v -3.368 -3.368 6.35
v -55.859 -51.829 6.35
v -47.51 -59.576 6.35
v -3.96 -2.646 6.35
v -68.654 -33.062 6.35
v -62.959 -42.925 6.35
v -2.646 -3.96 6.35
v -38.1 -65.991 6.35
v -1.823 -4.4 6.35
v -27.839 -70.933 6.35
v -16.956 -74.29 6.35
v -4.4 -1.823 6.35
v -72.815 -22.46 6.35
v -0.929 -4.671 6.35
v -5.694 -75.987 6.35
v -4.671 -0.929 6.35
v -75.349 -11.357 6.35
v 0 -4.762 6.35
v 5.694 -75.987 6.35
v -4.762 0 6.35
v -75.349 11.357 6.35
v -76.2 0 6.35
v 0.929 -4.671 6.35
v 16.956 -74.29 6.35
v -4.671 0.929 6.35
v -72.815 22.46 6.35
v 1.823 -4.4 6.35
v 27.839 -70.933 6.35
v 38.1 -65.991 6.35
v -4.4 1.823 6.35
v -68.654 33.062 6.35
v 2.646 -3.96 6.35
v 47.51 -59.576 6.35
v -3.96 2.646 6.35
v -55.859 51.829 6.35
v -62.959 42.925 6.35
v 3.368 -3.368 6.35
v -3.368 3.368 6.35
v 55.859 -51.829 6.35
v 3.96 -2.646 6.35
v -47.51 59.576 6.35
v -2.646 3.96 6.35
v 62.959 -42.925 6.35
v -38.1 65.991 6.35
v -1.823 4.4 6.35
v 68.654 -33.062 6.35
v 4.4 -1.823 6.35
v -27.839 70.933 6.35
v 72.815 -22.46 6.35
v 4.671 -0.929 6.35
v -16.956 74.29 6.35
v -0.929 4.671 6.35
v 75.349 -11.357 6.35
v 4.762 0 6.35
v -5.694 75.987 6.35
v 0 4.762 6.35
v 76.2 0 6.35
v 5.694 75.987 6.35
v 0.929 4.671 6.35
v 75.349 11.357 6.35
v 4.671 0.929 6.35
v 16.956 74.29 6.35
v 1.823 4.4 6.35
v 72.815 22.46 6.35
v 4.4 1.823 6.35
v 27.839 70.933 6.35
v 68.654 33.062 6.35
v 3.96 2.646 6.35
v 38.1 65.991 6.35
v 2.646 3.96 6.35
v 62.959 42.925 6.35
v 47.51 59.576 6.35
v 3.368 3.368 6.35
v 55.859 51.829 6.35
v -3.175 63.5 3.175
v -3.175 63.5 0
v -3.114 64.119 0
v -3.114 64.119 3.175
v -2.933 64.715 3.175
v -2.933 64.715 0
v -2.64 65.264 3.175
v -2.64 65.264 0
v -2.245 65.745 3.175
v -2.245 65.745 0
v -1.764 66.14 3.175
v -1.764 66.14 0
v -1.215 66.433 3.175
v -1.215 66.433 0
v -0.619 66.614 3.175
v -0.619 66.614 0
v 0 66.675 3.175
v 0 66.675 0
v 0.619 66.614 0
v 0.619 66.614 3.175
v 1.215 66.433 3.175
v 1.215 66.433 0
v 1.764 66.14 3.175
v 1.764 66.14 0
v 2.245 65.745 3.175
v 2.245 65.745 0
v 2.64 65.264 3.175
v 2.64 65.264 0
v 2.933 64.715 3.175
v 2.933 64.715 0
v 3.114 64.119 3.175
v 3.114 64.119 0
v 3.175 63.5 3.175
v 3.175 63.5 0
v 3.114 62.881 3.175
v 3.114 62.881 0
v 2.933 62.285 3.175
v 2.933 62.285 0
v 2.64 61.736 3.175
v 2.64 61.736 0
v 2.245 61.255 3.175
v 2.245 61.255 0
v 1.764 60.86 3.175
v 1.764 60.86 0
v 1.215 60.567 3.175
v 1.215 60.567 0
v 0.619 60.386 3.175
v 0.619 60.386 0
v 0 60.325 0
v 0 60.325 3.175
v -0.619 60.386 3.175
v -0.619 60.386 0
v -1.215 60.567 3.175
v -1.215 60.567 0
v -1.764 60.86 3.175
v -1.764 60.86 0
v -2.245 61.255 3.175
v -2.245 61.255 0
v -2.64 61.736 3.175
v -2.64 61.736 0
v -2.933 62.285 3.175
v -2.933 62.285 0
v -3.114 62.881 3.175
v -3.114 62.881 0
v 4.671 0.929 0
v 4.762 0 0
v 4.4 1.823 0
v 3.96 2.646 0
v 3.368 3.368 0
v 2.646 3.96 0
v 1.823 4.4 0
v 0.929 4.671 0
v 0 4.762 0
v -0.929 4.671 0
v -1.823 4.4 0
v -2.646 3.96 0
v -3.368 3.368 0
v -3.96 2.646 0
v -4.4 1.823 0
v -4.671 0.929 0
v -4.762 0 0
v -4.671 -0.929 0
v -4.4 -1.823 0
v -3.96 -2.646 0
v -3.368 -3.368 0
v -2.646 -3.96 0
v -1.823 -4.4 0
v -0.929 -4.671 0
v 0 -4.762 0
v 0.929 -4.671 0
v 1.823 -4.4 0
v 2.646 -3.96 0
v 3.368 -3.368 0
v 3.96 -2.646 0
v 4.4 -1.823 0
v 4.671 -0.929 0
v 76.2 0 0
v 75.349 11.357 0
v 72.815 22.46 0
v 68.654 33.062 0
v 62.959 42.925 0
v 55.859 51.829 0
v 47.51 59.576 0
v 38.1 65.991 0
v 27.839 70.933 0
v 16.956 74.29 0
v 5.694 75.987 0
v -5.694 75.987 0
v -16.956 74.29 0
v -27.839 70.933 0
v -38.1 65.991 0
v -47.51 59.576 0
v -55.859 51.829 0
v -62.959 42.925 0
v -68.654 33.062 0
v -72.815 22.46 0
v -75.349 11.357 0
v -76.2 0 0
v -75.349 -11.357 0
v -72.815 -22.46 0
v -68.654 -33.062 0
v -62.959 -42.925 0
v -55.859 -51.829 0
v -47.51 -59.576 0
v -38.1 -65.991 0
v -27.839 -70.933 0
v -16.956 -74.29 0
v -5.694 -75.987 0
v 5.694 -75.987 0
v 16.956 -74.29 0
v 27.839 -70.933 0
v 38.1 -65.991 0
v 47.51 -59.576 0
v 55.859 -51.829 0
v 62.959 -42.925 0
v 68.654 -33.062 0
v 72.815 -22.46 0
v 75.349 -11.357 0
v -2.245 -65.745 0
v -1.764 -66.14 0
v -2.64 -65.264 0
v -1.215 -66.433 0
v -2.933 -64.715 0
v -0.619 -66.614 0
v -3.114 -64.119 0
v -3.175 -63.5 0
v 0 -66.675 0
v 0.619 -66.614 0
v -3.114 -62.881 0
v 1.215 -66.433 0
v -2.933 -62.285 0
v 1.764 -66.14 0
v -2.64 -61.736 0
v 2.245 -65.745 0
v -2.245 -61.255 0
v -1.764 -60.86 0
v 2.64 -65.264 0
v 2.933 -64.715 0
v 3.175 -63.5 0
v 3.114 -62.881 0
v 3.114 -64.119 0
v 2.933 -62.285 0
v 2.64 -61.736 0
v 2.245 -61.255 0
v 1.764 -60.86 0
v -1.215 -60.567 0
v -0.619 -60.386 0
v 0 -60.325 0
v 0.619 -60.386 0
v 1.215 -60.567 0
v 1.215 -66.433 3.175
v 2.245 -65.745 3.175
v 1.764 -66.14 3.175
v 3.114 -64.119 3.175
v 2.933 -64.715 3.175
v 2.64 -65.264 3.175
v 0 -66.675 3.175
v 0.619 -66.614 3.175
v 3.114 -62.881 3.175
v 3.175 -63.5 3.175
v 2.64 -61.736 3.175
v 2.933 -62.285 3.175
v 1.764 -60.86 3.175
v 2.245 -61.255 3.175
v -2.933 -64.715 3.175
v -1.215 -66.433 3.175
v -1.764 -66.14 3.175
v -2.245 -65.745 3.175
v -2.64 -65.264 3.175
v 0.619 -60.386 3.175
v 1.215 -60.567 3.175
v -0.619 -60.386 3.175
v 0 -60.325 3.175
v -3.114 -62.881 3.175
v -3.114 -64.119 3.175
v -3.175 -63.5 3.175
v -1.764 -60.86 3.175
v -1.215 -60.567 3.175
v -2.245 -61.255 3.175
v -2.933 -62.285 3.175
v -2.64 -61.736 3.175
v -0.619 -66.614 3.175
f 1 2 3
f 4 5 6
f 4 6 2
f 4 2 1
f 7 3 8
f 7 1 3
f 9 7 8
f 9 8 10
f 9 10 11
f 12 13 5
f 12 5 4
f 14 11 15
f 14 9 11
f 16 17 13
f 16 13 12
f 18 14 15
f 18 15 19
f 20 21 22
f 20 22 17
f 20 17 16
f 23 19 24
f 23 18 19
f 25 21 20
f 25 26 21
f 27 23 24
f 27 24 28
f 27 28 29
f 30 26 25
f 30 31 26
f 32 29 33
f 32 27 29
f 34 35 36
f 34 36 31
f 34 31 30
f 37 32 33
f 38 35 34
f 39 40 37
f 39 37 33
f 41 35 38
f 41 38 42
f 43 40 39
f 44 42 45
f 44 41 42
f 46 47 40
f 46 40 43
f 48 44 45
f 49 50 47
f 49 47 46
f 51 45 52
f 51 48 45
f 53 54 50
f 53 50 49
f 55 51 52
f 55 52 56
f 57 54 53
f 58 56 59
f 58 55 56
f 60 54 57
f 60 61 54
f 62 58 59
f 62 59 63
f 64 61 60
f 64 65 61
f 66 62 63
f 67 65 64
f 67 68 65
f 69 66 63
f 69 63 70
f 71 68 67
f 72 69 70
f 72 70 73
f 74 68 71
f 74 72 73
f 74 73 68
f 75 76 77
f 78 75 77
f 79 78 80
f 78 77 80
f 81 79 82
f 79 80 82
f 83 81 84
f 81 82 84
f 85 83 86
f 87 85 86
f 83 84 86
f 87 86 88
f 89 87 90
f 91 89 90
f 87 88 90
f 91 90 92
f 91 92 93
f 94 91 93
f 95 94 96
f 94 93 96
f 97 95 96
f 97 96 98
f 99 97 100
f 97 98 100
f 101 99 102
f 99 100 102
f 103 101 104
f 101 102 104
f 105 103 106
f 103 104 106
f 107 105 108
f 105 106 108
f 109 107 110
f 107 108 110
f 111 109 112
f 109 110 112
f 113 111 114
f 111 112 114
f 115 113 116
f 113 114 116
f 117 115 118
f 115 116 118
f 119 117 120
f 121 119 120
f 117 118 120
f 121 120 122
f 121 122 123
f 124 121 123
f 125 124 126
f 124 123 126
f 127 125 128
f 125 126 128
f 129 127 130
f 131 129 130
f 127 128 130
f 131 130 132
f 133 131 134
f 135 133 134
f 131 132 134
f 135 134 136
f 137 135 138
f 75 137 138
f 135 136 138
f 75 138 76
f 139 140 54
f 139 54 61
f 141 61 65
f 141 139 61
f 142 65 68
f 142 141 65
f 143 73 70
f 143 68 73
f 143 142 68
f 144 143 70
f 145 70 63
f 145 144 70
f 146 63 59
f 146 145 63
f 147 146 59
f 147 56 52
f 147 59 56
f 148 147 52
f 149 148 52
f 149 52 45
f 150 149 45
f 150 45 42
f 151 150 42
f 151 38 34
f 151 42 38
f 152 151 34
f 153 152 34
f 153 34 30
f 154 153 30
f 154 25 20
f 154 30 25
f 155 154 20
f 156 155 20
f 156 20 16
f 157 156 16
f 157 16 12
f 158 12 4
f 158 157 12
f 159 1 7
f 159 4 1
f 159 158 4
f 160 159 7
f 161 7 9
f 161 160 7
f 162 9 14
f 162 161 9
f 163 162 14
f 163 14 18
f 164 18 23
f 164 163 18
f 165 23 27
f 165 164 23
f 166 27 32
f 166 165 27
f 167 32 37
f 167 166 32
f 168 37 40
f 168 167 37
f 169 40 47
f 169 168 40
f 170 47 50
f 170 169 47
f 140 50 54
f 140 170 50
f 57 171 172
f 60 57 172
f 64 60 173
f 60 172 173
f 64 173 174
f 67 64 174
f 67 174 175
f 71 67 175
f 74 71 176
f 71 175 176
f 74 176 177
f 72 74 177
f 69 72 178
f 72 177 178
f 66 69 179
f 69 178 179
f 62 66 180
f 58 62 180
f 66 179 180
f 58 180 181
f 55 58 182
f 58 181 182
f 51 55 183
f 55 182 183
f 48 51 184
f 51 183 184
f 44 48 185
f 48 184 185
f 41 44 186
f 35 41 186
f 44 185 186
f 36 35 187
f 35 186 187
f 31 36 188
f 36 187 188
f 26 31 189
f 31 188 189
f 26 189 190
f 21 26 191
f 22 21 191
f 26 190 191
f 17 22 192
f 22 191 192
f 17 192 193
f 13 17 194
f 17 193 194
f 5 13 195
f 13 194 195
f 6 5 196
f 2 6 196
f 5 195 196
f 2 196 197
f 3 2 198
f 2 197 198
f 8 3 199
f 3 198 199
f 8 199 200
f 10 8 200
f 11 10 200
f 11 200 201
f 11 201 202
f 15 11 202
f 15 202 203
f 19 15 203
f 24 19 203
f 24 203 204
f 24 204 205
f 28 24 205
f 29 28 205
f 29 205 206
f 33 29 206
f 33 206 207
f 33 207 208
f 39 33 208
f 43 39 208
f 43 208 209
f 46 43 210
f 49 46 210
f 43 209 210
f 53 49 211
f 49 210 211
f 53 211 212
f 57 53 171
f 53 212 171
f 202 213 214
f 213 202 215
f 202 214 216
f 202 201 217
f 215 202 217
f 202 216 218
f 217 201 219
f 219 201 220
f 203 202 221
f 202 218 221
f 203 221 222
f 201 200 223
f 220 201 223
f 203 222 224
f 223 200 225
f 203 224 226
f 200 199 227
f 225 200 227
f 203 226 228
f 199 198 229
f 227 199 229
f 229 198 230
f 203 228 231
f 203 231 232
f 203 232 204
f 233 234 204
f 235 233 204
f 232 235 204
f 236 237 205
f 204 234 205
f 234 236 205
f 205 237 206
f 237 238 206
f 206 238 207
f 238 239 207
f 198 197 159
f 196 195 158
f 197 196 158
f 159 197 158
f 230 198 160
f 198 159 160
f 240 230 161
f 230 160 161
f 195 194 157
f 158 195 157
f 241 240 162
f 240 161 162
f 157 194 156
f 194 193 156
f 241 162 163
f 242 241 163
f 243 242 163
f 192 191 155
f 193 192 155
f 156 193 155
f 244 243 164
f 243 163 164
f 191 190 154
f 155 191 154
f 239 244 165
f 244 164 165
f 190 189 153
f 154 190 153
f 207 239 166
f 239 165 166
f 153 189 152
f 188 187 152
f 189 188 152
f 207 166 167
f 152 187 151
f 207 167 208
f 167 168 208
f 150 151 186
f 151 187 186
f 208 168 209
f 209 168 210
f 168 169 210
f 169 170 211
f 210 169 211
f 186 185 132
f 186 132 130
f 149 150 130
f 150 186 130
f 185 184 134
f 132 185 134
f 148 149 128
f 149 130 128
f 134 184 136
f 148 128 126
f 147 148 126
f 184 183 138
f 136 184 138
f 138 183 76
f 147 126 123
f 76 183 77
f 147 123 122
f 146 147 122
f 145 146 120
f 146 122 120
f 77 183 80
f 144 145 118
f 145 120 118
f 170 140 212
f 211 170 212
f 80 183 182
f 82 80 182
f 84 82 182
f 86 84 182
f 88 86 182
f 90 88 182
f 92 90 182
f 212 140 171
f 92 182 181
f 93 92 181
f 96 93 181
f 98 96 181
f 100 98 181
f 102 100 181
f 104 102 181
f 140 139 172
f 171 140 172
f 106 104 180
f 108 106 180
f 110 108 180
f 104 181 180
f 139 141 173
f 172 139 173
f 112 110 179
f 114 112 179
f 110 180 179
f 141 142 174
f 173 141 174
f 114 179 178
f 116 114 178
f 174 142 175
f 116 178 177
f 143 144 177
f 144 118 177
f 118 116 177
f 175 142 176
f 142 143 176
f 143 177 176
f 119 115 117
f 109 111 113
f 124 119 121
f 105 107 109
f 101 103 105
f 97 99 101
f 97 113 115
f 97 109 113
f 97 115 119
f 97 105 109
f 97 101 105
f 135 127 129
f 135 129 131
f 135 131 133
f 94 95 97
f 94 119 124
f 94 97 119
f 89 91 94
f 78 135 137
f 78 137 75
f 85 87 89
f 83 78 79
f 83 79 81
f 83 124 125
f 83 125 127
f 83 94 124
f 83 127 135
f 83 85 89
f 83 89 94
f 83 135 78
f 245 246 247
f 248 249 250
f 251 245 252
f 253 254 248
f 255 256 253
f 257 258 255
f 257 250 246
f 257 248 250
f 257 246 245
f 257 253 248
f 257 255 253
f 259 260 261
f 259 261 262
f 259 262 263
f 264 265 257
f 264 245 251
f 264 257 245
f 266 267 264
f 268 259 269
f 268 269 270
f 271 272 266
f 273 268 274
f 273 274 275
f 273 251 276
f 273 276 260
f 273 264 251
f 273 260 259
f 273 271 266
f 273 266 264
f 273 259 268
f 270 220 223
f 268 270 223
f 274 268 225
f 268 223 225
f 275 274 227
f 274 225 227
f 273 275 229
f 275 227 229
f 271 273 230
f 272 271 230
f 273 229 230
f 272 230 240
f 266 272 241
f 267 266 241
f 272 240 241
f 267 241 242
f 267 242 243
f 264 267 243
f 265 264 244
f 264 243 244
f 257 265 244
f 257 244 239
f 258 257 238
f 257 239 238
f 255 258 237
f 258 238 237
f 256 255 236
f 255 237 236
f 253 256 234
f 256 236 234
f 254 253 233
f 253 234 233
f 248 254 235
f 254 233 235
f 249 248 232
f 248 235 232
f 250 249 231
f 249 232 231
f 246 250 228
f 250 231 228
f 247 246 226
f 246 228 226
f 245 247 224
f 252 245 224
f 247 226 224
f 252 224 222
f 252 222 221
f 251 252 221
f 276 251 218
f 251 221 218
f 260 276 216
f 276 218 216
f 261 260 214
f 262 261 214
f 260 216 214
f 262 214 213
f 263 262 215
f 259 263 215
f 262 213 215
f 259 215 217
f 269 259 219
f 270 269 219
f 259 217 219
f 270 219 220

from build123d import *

# Parameters (mm, degrees)
SKETCH1_R               = 76.2
BOSS_EXTRUDE1_DEPTH     = 6.35
CUT_EXTRUDE3_DEPTH      = 108.95
CUT_EXTRUDE3_DEPTH_BACK = 108.95
SKETCH1_4_R             = 4.7625
SKETCH2_R               = 3.175
CUT_EXTRUDE4_DEPTH      = 3.175


with BuildPart() as part:
    # Sketch1 → Boss-Extrude1 (new body)
    with BuildSketch(Plane.XY):
        Circle(SKETCH1_R)
    extrude(amount=BOSS_EXTRUDE1_DEPTH)

    # Sketch1<4> → Cut-Extrude3 (cut, two sides: drawn at the far end of the back side and taken through both)
    with BuildSketch(Plane.XY.offset(-CUT_EXTRUDE3_DEPTH_BACK)):
        Circle(SKETCH1_4_R)
    extrude(amount=CUT_EXTRUDE3_DEPTH + CUT_EXTRUDE3_DEPTH_BACK, mode=Mode.SUBTRACT)

    # Sketch2 → Cut-Extrude4 (cut)
    with BuildSketch(Plane(origin=(0, 0, 0), x_dir=(-1, 0, 0), z_dir=(0, 0, -1))):
        with Locations((0, 63.5)):
            Circle(SKETCH2_R)
        with Locations((0, -63.5)):
            Circle(SKETCH2_R)
    extrude(amount=-CUT_EXTRUDE4_DEPTH, mode=Mode.SUBTRACT)


solid = part.part
